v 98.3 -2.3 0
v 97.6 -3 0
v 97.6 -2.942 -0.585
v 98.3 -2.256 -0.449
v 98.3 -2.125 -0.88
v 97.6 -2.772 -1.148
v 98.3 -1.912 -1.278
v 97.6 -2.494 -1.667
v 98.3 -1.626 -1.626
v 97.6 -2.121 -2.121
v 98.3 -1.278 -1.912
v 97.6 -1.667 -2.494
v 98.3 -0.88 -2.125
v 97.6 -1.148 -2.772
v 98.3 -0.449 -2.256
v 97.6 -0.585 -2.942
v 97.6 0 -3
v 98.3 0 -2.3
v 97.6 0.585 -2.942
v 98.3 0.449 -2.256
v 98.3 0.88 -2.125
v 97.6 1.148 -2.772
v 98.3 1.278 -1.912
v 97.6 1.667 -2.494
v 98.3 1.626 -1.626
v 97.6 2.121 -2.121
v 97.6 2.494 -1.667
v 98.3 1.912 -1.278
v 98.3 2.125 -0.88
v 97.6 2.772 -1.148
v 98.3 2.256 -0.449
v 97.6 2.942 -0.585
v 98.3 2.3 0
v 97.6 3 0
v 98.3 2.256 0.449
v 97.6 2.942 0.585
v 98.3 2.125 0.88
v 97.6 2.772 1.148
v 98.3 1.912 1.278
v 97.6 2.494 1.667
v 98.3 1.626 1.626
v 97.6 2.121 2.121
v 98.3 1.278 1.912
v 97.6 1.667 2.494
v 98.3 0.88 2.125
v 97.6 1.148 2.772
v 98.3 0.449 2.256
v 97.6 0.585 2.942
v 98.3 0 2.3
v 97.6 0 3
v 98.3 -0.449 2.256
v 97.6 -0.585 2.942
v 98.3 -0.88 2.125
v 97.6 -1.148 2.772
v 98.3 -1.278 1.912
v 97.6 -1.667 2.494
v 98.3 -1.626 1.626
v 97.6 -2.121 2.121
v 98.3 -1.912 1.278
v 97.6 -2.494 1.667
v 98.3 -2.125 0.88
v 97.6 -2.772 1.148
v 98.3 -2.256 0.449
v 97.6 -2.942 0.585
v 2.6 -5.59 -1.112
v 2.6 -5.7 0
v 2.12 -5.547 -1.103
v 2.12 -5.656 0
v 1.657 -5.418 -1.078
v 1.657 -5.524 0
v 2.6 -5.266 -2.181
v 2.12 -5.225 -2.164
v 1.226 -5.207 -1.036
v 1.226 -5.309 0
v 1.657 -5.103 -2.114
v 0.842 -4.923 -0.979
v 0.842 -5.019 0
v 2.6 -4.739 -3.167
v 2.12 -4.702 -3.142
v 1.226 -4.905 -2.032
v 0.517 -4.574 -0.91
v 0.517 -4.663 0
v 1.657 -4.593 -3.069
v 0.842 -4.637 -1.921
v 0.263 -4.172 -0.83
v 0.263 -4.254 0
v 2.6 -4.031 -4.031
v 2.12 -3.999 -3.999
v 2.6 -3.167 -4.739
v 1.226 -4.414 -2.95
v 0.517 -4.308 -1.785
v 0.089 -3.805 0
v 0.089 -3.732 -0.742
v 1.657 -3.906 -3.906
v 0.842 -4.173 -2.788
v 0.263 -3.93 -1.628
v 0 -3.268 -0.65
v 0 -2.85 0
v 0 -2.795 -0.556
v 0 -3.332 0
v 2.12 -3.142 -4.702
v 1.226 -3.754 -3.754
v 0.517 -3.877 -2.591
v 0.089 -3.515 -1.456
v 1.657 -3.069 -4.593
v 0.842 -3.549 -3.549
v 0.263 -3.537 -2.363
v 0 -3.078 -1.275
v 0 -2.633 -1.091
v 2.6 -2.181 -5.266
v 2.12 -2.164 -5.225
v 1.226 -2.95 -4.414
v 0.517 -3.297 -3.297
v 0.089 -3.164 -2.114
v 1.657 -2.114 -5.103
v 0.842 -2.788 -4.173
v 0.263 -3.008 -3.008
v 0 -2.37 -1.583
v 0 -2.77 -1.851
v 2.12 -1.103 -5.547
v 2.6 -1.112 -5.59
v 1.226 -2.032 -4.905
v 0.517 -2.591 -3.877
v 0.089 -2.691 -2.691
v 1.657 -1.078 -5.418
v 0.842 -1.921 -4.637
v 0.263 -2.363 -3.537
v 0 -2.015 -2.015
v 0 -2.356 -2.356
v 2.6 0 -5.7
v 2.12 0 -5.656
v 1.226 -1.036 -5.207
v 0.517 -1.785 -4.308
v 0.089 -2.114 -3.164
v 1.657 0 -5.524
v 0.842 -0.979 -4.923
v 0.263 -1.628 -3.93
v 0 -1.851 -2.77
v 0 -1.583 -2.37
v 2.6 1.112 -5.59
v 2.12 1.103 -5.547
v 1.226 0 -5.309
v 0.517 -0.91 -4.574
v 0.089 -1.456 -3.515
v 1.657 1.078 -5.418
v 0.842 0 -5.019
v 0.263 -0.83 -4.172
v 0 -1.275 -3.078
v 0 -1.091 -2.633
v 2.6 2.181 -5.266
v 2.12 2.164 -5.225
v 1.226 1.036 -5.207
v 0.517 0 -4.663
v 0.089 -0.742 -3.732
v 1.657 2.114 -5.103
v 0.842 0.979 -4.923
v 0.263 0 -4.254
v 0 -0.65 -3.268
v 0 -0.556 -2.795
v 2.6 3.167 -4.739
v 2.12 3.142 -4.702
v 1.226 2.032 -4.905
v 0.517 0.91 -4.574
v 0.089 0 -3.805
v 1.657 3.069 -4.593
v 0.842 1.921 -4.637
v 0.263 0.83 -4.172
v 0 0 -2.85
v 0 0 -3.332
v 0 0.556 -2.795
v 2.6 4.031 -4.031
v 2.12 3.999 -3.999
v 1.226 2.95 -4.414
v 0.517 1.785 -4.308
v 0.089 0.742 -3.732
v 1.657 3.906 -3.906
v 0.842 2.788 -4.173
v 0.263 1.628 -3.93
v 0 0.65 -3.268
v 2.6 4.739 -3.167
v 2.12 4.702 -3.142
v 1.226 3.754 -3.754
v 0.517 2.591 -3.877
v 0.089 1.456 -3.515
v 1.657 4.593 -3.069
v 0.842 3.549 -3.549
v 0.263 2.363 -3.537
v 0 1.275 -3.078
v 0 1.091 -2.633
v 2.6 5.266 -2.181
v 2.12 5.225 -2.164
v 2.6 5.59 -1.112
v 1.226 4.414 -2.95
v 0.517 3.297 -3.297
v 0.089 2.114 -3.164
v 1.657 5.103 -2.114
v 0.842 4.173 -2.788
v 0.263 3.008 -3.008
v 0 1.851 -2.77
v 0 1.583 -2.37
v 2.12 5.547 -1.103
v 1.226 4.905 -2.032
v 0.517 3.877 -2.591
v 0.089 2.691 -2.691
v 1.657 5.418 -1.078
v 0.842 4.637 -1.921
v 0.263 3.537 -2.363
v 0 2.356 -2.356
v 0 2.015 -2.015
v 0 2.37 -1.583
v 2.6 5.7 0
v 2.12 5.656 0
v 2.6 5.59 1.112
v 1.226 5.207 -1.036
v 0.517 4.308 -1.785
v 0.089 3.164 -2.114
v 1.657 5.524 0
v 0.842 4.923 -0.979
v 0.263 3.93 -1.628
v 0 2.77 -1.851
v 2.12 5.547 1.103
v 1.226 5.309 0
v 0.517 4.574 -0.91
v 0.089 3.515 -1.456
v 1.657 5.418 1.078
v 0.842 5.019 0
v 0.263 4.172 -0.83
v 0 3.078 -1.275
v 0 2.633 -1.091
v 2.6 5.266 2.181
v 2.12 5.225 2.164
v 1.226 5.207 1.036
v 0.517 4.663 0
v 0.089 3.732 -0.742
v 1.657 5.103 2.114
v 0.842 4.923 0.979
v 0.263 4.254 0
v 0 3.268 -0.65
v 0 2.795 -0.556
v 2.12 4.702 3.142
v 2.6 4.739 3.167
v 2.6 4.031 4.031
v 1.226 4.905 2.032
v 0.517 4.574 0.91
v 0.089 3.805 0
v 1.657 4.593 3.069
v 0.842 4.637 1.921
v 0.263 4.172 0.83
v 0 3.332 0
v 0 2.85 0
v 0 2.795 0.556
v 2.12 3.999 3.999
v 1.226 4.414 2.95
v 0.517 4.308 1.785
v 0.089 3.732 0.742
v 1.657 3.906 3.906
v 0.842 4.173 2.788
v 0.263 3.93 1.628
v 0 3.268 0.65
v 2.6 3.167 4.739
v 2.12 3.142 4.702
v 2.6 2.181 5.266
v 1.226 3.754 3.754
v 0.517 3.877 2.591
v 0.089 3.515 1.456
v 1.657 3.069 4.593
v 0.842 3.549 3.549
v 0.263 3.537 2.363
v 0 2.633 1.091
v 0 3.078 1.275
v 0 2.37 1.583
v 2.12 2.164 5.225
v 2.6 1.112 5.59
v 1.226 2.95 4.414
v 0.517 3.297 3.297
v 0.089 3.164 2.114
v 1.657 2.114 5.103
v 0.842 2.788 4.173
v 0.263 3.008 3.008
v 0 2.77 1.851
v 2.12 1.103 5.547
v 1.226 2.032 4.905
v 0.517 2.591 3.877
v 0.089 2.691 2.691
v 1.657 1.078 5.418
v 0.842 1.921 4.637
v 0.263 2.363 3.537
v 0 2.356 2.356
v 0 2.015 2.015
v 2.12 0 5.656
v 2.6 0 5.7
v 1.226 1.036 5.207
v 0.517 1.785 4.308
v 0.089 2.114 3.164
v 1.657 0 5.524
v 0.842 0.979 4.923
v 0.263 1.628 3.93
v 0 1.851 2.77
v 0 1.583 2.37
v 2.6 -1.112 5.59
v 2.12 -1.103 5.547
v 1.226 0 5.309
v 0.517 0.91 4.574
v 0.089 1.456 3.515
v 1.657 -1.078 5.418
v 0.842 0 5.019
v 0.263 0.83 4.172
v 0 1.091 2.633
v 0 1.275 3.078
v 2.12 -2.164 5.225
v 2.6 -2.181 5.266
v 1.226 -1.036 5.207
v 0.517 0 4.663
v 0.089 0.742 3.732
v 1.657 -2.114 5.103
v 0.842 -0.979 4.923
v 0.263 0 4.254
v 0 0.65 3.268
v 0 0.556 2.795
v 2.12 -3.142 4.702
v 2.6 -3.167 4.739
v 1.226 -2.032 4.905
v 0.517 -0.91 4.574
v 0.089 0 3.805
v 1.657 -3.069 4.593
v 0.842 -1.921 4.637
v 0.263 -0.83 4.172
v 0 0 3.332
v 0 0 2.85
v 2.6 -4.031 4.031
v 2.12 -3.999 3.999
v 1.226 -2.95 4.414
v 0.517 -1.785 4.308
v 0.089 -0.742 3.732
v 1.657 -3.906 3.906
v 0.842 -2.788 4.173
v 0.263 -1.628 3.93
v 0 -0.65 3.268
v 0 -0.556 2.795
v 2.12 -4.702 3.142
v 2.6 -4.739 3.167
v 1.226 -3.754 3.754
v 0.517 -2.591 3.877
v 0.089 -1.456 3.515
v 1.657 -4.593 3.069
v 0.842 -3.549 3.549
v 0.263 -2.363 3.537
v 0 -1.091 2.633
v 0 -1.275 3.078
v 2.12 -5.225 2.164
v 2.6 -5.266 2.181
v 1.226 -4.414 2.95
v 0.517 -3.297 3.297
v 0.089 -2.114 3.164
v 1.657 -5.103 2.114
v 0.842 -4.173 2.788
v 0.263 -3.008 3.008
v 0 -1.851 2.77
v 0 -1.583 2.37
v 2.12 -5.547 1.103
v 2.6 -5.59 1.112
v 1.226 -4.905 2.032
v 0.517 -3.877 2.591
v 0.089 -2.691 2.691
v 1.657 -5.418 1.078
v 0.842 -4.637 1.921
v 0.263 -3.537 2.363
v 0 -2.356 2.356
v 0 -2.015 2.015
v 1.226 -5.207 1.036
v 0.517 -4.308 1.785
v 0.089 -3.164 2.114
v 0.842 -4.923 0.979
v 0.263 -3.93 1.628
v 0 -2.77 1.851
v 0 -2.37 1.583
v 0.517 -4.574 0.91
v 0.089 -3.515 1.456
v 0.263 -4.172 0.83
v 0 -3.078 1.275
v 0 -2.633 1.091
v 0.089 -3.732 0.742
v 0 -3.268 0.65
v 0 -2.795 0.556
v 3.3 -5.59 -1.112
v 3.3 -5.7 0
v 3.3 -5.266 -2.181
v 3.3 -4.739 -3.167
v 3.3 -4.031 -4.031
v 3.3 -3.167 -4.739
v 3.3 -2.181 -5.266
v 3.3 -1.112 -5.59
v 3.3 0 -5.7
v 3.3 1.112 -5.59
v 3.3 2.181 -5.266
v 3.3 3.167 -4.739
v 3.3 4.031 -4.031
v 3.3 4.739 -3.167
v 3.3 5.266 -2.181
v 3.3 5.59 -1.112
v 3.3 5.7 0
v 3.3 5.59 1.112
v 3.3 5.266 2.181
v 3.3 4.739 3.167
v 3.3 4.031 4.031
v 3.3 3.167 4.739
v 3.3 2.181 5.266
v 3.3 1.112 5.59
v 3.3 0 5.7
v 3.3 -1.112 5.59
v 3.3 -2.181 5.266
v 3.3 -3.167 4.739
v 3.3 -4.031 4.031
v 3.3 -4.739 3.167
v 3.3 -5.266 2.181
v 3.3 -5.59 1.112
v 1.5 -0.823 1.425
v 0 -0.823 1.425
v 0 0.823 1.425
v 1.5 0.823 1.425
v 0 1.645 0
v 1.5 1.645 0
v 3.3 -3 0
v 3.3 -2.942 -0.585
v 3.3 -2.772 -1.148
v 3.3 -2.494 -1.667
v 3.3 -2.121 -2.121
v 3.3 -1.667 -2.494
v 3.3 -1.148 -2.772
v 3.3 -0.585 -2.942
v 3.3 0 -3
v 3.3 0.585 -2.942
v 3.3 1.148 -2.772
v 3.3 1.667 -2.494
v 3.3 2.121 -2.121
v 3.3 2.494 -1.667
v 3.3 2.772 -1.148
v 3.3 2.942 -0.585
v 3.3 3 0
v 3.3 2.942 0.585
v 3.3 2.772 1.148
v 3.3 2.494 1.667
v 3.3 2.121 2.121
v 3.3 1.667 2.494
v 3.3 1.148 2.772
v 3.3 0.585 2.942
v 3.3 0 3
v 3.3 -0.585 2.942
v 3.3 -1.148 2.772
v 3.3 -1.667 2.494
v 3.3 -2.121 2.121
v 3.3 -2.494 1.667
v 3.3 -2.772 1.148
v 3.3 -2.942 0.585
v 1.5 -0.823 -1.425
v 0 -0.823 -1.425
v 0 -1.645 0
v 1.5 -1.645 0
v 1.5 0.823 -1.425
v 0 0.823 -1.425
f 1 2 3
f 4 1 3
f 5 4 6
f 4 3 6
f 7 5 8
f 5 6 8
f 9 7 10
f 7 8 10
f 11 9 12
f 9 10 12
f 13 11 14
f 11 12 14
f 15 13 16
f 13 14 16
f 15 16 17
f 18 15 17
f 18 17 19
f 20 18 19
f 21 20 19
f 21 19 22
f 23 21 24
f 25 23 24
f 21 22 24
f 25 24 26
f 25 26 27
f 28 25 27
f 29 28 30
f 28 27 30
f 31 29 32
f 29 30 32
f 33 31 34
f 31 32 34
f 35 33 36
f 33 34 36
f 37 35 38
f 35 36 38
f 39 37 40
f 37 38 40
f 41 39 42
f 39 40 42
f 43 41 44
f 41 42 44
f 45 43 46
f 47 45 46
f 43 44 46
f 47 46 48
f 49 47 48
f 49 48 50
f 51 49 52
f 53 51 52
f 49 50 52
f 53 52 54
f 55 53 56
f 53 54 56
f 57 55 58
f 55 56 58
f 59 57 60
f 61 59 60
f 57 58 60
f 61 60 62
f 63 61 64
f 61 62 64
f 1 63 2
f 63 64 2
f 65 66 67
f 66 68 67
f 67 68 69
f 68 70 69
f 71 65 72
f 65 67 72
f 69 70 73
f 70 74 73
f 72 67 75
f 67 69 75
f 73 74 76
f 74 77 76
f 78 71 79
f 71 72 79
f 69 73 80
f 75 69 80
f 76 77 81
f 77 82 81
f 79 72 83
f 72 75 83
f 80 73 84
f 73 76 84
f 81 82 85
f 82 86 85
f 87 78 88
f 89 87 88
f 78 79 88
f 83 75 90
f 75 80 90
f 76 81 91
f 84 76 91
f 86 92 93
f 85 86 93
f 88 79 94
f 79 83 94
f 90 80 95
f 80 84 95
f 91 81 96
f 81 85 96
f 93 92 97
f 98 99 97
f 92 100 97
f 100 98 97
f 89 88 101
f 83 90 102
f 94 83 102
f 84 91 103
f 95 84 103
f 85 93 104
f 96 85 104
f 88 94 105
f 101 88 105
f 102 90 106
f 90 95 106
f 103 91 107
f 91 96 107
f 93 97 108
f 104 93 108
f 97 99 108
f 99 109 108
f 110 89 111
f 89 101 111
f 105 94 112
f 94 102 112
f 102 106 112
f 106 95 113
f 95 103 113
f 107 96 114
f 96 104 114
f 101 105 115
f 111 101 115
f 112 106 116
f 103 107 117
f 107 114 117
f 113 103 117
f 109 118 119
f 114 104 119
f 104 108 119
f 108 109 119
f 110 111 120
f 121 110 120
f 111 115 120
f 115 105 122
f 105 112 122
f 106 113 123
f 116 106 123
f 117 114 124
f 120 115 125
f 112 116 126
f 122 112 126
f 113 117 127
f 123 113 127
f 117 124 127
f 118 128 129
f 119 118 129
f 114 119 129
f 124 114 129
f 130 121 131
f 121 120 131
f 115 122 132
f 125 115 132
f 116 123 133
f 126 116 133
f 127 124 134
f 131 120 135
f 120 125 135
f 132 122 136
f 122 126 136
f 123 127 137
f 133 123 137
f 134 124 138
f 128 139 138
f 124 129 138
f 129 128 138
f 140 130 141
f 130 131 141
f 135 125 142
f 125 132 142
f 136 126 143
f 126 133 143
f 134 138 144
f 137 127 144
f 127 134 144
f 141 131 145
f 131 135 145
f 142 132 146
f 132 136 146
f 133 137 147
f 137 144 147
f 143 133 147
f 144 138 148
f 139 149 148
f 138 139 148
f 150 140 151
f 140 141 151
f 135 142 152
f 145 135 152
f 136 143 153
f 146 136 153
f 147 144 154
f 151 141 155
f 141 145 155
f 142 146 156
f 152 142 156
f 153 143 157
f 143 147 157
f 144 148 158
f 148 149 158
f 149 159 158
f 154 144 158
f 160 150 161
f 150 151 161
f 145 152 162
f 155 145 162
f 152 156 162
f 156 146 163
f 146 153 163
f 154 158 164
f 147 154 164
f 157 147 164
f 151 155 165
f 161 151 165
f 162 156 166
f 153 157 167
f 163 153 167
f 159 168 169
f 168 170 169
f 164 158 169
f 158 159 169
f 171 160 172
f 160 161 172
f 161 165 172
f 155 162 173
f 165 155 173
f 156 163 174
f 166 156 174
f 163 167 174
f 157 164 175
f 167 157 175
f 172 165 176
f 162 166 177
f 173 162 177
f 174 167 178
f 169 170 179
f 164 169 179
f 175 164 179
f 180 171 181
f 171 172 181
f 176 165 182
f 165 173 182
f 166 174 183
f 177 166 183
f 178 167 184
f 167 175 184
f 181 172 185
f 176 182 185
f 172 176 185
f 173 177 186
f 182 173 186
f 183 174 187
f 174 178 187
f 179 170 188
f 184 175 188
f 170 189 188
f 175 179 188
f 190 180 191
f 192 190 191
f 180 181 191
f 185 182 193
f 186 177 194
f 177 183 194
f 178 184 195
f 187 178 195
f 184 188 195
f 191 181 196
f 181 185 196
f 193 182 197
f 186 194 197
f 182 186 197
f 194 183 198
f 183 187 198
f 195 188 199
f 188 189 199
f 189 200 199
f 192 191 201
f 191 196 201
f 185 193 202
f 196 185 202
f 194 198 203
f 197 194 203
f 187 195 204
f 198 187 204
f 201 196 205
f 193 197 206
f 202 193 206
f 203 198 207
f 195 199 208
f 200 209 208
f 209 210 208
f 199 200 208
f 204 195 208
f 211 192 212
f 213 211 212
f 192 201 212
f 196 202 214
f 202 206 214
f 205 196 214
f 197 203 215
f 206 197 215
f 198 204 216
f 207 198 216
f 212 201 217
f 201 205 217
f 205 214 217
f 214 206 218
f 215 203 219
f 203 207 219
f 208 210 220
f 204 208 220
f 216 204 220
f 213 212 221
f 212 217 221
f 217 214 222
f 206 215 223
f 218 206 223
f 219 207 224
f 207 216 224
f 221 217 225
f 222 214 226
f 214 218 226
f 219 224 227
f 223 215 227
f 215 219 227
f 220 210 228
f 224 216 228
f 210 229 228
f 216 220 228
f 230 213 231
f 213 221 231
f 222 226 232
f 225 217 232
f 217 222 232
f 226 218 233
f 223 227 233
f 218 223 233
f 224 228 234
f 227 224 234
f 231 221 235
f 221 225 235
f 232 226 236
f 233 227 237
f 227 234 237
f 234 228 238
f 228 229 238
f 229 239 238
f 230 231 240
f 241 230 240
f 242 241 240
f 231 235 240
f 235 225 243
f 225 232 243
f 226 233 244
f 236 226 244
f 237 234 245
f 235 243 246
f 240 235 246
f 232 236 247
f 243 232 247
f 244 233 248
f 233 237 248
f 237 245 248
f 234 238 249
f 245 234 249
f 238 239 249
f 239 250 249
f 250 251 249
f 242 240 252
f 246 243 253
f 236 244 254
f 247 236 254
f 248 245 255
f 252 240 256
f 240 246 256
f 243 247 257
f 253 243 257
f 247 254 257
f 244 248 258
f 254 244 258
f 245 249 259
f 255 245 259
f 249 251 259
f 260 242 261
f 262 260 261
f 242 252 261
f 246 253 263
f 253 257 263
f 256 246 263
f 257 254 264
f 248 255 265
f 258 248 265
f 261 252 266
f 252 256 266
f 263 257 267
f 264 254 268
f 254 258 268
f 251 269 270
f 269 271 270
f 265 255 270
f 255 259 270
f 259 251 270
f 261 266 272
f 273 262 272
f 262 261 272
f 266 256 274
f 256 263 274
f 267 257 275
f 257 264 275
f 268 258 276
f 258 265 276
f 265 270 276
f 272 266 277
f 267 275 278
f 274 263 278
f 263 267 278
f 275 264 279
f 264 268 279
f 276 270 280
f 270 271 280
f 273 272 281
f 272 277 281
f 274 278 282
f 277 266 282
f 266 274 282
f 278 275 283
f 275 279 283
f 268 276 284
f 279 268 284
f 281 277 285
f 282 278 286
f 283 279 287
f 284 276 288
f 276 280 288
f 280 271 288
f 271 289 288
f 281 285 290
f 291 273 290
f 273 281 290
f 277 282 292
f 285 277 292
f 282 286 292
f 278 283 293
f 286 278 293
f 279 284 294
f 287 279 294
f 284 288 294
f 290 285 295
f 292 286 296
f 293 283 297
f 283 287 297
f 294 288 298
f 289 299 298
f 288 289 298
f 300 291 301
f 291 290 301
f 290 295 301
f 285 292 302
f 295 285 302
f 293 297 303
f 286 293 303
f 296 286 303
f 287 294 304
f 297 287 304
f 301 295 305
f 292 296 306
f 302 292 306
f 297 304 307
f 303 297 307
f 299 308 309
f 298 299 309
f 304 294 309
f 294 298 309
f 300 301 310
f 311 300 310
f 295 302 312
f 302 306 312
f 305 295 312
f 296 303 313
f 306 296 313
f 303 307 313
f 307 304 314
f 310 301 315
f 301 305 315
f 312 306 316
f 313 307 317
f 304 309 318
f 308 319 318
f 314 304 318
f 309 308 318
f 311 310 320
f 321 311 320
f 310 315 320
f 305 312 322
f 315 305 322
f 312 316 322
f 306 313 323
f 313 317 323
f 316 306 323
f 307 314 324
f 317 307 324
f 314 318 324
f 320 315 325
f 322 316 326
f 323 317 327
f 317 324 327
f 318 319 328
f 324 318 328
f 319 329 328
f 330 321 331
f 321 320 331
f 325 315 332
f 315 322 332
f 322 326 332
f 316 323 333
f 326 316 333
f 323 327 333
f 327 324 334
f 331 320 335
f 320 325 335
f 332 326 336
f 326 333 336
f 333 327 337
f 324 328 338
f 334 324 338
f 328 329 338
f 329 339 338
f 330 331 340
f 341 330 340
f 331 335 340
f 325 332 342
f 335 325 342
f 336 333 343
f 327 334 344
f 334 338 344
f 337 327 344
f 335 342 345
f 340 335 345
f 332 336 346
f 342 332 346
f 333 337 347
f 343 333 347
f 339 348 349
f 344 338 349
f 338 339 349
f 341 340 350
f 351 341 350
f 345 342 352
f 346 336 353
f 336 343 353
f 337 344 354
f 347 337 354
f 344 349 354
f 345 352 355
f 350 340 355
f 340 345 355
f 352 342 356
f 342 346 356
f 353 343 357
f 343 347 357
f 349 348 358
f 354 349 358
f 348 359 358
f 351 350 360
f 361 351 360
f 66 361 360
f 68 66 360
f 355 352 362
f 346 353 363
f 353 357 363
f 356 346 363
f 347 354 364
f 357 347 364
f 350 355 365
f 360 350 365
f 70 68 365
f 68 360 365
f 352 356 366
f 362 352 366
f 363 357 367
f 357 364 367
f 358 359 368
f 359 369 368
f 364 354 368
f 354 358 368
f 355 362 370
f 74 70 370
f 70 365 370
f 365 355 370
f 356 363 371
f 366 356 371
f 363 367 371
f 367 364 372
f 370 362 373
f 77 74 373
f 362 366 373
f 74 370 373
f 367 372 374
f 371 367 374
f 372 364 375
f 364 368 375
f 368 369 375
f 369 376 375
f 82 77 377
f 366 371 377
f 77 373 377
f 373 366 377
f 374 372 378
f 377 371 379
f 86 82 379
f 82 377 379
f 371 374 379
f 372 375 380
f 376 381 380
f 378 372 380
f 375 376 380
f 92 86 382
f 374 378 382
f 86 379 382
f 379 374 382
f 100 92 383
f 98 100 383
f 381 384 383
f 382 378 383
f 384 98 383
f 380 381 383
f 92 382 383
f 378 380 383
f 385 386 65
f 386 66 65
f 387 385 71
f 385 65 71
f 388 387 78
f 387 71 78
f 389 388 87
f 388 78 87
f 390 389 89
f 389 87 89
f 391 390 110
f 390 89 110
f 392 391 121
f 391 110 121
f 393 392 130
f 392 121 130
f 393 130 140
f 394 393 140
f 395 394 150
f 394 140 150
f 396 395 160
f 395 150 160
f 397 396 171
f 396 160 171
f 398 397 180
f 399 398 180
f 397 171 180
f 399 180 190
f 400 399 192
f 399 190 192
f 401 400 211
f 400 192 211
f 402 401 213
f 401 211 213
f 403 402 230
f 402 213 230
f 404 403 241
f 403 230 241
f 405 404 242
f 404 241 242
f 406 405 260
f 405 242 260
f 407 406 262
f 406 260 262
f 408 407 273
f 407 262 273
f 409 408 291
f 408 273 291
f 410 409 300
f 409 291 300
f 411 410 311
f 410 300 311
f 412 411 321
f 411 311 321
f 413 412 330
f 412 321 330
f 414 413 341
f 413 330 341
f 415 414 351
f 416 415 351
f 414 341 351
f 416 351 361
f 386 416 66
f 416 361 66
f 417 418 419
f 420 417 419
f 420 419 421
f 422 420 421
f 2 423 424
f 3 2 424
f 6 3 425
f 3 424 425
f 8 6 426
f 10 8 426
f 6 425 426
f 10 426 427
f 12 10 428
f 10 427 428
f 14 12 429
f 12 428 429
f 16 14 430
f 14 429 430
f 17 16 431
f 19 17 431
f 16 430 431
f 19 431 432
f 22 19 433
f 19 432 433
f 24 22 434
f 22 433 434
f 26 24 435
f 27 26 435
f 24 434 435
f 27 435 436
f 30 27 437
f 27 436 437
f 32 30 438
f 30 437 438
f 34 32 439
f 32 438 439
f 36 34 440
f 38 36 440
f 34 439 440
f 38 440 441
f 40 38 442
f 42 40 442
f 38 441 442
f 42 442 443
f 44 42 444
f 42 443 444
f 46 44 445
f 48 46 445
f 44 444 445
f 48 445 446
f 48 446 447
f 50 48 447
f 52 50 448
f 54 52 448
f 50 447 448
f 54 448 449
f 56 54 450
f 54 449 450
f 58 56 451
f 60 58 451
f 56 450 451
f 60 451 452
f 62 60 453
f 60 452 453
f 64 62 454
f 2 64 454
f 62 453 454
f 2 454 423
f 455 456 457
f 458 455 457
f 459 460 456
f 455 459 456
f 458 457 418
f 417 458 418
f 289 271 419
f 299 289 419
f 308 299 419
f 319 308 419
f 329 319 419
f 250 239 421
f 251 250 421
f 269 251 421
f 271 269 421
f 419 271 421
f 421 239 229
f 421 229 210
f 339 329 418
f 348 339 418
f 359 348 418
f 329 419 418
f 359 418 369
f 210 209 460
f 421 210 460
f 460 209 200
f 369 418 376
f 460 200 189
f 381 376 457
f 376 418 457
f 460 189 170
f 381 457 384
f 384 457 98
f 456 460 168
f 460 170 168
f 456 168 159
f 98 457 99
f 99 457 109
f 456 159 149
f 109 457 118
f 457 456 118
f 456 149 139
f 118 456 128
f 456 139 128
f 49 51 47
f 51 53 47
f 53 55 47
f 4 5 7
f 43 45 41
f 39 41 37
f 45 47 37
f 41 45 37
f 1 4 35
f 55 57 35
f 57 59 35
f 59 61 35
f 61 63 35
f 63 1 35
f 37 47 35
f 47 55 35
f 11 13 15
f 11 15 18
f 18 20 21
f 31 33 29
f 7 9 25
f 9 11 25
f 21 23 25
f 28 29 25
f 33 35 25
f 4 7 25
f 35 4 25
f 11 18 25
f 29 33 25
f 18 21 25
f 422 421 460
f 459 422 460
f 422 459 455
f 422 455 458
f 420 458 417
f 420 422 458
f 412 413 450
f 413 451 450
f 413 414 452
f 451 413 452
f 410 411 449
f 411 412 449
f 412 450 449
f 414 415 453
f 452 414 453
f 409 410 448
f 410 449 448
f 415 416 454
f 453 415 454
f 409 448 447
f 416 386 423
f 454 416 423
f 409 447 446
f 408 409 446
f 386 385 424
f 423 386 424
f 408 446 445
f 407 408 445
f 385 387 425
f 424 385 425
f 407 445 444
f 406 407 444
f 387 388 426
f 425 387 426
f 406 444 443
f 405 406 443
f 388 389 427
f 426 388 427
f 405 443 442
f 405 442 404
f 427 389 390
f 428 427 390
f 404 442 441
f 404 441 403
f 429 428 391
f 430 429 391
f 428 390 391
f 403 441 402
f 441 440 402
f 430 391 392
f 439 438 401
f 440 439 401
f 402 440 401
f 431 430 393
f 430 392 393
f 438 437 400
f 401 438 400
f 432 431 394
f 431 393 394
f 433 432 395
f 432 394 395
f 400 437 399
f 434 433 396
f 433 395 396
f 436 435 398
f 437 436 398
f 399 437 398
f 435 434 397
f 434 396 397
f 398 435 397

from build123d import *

# Parameters (mm, degrees)
PAH1_SIZE             = 0.7
KES_EKSTR_ZYON1_DEPTH = 1.5


with BuildPart() as part:
    # Çizim1 → Döndür1 (revolve)
    with BuildSketch(Plane.XY, mode=Mode.PRIVATE) as d_nd_r1_sk:
        with BuildLine():
            Line((0, 0), (98.3, 0))
            Line((98.3, 0), (98.3, 3))
            Line((98.3, 3), (3.3, 3))
            Line((3.3, 3), (3.3, 5.7))
            Line((3.3, 5.7), (2.6, 5.7))
            ThreePointArc((2.6, 5.7), (0.671107831, 4.848726189), (0, 2.85))
            Line((0, 2.85), (0, 0))
        make_face()
    revolve(d_nd_r1_sk.sketch.rotate(Axis((0, 0, 0), (1, 0, 0)), 180), axis=Axis((0, 0, 0), (1, 0, 0)))

    # Pah1
    pah1_edges = [part.edges().sort_by_distance(p)[0] for p in [
        (98.3, 3, 0),
    ]]
    chamfer(pah1_edges, length=PAH1_SIZE)

    # Çizim2 → Kes-Ekstrüzyon1 (cut)
    with BuildSketch(Plane.ZY):
        Polygon((0, 1.645448267), (-1.425, 0.822724134), (-1.425, -0.822724134), (0, -1.645448267), (1.425, -0.822724134), (1.425, 0.822724134), align=None)
    extrude(amount=-KES_EKSTR_ZYON1_DEPTH, mode=Mode.SUBTRACT)


solid = part.part
